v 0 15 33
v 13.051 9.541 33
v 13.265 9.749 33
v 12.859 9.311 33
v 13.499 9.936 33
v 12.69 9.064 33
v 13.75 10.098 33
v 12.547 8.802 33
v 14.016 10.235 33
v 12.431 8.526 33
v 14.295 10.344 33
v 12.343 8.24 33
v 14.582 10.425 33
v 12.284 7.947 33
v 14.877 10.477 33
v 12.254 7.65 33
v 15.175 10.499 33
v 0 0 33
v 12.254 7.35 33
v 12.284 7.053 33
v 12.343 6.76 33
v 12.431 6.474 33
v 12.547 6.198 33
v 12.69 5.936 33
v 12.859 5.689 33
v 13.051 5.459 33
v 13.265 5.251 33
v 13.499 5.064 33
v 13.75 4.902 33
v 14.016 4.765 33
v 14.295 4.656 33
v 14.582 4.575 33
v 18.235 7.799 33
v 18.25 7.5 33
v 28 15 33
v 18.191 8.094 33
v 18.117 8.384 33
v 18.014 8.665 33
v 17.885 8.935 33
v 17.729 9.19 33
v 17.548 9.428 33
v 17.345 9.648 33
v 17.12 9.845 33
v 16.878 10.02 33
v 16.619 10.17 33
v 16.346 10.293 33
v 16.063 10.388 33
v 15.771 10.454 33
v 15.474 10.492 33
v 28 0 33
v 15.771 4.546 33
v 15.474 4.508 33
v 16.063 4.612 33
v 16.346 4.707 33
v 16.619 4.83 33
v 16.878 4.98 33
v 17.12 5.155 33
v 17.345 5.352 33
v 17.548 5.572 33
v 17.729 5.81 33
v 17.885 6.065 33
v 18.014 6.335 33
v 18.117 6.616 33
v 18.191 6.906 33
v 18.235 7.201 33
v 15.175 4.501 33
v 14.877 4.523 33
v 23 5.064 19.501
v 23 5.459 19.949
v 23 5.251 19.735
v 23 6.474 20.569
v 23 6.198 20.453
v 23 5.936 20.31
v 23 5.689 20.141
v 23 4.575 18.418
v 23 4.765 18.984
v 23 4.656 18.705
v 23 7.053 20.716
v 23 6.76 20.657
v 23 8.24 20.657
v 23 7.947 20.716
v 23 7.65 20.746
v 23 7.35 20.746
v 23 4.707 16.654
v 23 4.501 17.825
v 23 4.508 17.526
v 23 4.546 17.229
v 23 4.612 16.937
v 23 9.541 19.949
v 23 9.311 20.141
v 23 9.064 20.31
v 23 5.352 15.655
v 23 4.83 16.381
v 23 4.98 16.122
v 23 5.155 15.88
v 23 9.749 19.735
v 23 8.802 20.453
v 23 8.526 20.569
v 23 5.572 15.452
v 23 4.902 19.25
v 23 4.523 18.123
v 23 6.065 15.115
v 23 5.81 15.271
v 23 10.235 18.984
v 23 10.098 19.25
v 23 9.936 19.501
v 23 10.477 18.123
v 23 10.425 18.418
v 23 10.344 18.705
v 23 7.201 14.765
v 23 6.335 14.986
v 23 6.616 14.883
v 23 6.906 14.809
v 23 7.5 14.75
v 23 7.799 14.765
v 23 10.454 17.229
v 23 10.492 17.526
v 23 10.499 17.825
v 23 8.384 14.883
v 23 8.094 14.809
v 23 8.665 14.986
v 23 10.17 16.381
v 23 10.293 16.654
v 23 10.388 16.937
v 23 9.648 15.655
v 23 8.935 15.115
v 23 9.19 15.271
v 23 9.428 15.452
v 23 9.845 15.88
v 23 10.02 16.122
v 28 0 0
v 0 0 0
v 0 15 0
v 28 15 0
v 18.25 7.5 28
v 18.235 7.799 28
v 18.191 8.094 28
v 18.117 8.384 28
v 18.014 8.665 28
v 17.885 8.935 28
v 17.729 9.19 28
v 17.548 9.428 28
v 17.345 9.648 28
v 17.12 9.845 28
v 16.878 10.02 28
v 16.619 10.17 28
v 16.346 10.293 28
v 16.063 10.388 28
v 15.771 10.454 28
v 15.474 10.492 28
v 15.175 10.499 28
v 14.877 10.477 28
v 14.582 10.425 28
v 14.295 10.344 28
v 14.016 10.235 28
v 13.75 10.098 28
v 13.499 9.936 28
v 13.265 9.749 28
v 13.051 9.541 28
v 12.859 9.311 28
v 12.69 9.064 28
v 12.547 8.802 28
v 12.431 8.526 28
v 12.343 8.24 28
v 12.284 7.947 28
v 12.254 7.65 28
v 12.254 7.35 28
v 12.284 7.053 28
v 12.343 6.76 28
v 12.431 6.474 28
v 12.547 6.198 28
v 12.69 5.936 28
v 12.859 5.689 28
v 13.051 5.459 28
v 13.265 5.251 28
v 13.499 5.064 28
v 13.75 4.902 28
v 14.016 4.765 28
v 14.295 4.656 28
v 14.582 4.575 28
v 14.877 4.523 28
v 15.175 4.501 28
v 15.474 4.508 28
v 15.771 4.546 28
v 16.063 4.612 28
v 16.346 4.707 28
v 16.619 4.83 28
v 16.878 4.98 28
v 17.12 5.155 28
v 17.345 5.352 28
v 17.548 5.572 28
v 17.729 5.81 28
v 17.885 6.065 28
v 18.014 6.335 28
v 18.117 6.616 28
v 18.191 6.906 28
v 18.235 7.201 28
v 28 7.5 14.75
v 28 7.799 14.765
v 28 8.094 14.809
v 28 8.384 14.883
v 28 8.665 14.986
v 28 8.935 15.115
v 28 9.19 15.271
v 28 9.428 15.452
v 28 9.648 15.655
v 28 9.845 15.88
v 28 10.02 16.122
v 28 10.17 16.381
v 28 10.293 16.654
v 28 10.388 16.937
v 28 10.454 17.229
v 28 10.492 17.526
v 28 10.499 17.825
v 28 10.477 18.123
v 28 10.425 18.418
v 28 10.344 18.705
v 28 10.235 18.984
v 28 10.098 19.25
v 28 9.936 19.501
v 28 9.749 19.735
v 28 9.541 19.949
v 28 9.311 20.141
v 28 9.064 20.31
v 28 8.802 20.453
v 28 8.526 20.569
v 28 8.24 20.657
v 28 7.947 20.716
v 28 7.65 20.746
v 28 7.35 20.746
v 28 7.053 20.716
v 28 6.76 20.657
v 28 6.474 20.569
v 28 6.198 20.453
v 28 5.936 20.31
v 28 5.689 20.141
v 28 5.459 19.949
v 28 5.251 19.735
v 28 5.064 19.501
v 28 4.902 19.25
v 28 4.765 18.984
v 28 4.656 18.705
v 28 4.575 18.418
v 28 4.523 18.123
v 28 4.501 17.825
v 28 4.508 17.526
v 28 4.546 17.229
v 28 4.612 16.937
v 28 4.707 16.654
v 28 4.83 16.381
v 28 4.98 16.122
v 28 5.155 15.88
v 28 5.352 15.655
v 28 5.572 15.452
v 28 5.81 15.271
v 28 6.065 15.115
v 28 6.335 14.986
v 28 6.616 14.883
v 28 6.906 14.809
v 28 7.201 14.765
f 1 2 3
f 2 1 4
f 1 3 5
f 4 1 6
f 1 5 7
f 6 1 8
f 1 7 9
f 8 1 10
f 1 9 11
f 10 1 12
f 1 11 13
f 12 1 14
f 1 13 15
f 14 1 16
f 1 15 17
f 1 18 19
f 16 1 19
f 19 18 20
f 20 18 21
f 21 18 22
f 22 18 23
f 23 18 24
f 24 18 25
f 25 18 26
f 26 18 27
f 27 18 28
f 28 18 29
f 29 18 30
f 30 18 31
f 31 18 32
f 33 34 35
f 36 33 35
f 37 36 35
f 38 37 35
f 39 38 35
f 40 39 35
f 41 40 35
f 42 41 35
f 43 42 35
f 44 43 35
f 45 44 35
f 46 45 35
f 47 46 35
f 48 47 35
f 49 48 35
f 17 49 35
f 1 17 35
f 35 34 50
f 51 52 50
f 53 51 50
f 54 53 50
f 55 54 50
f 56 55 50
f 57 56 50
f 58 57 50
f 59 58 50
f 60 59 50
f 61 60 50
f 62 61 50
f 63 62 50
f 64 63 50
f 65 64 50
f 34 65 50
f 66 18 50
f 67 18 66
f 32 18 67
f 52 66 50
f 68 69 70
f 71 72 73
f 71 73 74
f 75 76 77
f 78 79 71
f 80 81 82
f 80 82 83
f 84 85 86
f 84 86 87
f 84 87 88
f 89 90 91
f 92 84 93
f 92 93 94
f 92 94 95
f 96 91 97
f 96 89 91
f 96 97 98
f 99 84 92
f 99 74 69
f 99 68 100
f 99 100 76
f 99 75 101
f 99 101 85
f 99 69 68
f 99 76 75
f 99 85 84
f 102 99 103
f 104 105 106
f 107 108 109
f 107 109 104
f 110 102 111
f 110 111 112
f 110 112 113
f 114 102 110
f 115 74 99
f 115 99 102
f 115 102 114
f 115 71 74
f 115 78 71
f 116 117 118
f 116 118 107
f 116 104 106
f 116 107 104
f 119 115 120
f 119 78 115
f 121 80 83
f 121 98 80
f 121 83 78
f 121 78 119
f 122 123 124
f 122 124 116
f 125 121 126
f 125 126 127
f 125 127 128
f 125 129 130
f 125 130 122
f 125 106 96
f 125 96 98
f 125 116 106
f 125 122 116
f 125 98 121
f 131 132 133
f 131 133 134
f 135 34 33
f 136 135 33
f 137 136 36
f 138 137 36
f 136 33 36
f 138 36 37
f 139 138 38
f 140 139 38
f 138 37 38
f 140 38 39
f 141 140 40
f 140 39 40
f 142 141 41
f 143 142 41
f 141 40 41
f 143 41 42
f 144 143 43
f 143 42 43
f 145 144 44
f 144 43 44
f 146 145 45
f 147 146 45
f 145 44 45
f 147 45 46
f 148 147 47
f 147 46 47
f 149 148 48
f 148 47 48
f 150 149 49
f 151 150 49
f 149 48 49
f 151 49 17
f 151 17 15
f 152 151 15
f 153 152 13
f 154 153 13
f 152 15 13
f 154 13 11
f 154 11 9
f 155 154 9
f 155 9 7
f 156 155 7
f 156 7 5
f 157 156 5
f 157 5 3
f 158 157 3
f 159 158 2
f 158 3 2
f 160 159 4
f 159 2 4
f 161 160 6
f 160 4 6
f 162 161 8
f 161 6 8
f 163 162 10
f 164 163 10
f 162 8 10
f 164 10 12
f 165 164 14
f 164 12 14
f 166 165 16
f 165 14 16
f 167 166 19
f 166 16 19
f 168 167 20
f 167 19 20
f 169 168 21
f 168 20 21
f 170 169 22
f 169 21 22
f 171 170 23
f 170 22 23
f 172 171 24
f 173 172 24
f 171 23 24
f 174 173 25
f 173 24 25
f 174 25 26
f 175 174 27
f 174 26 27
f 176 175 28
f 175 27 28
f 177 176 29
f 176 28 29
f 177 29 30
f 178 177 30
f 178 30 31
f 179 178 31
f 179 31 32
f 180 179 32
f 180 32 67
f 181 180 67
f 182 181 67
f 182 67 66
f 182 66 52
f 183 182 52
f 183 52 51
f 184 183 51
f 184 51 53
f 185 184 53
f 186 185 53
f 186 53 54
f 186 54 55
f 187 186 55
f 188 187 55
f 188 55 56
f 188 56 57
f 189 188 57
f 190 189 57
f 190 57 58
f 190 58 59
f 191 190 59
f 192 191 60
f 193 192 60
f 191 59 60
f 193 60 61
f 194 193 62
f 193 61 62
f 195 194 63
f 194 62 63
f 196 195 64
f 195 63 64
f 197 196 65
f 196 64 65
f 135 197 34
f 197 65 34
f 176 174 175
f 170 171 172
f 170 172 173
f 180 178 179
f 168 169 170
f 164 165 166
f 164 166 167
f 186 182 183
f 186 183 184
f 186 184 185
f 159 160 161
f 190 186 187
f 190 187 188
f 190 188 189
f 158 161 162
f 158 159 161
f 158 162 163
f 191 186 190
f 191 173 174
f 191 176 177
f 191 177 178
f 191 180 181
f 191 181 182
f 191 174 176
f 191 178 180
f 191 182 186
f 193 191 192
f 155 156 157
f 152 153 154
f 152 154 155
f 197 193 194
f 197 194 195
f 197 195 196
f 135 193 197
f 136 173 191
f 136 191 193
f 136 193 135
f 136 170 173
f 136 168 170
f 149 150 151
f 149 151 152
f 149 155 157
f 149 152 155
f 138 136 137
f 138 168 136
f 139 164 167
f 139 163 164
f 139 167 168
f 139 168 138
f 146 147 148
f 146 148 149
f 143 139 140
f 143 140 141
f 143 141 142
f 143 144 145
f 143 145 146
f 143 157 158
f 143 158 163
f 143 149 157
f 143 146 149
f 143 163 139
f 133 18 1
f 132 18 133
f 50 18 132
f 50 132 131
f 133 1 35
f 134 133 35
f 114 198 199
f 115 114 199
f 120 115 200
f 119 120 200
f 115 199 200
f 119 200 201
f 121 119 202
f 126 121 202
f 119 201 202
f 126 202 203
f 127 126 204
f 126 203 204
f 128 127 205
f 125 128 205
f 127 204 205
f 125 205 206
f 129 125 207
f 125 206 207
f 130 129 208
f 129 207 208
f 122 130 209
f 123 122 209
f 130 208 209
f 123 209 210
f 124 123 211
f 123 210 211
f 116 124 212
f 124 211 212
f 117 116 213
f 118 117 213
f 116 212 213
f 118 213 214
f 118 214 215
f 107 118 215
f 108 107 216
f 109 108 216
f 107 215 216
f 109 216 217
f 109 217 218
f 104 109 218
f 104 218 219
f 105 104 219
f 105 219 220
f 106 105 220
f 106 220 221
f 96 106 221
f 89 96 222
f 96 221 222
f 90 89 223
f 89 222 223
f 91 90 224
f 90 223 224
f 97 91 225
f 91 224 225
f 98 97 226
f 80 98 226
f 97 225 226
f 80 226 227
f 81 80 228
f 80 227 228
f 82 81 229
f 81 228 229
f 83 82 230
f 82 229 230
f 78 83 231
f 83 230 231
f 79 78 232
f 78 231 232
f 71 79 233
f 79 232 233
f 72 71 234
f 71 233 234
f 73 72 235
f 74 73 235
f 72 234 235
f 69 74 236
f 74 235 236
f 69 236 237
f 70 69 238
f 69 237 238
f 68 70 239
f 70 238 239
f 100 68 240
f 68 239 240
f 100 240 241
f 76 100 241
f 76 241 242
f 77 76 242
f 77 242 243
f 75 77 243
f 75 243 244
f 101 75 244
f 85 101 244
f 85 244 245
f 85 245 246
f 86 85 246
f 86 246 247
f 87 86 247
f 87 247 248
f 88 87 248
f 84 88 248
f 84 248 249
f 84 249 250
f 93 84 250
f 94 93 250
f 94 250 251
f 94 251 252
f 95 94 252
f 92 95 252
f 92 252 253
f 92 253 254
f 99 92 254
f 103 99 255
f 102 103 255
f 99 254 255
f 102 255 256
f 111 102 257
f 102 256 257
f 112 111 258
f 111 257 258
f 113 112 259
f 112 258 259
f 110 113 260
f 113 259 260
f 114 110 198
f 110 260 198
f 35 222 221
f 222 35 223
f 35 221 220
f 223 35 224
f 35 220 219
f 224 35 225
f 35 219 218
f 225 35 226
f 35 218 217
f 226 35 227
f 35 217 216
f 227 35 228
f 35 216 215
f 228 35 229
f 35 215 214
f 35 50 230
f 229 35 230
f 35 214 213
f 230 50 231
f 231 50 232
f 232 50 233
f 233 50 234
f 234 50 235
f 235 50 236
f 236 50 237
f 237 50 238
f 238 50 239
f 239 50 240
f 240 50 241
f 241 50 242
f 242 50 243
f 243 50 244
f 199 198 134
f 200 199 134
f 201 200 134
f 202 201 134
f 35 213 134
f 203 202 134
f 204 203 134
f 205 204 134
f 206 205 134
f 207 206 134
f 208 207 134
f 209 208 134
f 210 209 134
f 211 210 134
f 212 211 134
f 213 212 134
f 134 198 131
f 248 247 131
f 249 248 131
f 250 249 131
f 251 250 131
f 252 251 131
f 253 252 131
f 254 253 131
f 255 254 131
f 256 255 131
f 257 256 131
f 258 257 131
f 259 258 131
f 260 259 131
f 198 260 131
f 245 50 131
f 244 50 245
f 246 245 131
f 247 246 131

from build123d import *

# Parameters (mm, degrees)
SKETCH_1_W          = 28
SKETCH_1_H          = 33
EXTRUDE_1_DEPTH     = 15
SKETCH_2_R          = 3
CUT_EXTRUDE_1_DEPTH = 5
SKETCH_3_R          = 3
CUT_EXTRUDE_2_DEPTH = 5


with BuildPart() as part:
    # 草图1 → 凸台-拉伸1 (new body)
    with BuildSketch(Plane(origin=(0, 0, 0), x_dir=(1, 0, 0), z_dir=(0, 1, 0))):
        with Locations((14, -16.5)):
            Rectangle(SKETCH_1_W, SKETCH_1_H)
    extrude(amount=EXTRUDE_1_DEPTH)

    # 草图2 → 切除-拉伸1 (cut)
    with BuildSketch(Plane.XY.offset(33)):
        with Locations((15.25, 7.5)):
            Circle(SKETCH_2_R)
    extrude(amount=-CUT_EXTRUDE_1_DEPTH, mode=Mode.SUBTRACT)

    # 草图3 → 切除-拉伸2 (cut)
    with BuildSketch(Plane(origin=(28, 0, 0), x_dir=(0, 0, -1), z_dir=(1, 0, 0))):
        with Locations((-17.75, 7.5)):
            Circle(SKETCH_3_R)
    extrude(amount=-CUT_EXTRUDE_2_DEPTH, mode=Mode.SUBTRACT)


solid = part.part
